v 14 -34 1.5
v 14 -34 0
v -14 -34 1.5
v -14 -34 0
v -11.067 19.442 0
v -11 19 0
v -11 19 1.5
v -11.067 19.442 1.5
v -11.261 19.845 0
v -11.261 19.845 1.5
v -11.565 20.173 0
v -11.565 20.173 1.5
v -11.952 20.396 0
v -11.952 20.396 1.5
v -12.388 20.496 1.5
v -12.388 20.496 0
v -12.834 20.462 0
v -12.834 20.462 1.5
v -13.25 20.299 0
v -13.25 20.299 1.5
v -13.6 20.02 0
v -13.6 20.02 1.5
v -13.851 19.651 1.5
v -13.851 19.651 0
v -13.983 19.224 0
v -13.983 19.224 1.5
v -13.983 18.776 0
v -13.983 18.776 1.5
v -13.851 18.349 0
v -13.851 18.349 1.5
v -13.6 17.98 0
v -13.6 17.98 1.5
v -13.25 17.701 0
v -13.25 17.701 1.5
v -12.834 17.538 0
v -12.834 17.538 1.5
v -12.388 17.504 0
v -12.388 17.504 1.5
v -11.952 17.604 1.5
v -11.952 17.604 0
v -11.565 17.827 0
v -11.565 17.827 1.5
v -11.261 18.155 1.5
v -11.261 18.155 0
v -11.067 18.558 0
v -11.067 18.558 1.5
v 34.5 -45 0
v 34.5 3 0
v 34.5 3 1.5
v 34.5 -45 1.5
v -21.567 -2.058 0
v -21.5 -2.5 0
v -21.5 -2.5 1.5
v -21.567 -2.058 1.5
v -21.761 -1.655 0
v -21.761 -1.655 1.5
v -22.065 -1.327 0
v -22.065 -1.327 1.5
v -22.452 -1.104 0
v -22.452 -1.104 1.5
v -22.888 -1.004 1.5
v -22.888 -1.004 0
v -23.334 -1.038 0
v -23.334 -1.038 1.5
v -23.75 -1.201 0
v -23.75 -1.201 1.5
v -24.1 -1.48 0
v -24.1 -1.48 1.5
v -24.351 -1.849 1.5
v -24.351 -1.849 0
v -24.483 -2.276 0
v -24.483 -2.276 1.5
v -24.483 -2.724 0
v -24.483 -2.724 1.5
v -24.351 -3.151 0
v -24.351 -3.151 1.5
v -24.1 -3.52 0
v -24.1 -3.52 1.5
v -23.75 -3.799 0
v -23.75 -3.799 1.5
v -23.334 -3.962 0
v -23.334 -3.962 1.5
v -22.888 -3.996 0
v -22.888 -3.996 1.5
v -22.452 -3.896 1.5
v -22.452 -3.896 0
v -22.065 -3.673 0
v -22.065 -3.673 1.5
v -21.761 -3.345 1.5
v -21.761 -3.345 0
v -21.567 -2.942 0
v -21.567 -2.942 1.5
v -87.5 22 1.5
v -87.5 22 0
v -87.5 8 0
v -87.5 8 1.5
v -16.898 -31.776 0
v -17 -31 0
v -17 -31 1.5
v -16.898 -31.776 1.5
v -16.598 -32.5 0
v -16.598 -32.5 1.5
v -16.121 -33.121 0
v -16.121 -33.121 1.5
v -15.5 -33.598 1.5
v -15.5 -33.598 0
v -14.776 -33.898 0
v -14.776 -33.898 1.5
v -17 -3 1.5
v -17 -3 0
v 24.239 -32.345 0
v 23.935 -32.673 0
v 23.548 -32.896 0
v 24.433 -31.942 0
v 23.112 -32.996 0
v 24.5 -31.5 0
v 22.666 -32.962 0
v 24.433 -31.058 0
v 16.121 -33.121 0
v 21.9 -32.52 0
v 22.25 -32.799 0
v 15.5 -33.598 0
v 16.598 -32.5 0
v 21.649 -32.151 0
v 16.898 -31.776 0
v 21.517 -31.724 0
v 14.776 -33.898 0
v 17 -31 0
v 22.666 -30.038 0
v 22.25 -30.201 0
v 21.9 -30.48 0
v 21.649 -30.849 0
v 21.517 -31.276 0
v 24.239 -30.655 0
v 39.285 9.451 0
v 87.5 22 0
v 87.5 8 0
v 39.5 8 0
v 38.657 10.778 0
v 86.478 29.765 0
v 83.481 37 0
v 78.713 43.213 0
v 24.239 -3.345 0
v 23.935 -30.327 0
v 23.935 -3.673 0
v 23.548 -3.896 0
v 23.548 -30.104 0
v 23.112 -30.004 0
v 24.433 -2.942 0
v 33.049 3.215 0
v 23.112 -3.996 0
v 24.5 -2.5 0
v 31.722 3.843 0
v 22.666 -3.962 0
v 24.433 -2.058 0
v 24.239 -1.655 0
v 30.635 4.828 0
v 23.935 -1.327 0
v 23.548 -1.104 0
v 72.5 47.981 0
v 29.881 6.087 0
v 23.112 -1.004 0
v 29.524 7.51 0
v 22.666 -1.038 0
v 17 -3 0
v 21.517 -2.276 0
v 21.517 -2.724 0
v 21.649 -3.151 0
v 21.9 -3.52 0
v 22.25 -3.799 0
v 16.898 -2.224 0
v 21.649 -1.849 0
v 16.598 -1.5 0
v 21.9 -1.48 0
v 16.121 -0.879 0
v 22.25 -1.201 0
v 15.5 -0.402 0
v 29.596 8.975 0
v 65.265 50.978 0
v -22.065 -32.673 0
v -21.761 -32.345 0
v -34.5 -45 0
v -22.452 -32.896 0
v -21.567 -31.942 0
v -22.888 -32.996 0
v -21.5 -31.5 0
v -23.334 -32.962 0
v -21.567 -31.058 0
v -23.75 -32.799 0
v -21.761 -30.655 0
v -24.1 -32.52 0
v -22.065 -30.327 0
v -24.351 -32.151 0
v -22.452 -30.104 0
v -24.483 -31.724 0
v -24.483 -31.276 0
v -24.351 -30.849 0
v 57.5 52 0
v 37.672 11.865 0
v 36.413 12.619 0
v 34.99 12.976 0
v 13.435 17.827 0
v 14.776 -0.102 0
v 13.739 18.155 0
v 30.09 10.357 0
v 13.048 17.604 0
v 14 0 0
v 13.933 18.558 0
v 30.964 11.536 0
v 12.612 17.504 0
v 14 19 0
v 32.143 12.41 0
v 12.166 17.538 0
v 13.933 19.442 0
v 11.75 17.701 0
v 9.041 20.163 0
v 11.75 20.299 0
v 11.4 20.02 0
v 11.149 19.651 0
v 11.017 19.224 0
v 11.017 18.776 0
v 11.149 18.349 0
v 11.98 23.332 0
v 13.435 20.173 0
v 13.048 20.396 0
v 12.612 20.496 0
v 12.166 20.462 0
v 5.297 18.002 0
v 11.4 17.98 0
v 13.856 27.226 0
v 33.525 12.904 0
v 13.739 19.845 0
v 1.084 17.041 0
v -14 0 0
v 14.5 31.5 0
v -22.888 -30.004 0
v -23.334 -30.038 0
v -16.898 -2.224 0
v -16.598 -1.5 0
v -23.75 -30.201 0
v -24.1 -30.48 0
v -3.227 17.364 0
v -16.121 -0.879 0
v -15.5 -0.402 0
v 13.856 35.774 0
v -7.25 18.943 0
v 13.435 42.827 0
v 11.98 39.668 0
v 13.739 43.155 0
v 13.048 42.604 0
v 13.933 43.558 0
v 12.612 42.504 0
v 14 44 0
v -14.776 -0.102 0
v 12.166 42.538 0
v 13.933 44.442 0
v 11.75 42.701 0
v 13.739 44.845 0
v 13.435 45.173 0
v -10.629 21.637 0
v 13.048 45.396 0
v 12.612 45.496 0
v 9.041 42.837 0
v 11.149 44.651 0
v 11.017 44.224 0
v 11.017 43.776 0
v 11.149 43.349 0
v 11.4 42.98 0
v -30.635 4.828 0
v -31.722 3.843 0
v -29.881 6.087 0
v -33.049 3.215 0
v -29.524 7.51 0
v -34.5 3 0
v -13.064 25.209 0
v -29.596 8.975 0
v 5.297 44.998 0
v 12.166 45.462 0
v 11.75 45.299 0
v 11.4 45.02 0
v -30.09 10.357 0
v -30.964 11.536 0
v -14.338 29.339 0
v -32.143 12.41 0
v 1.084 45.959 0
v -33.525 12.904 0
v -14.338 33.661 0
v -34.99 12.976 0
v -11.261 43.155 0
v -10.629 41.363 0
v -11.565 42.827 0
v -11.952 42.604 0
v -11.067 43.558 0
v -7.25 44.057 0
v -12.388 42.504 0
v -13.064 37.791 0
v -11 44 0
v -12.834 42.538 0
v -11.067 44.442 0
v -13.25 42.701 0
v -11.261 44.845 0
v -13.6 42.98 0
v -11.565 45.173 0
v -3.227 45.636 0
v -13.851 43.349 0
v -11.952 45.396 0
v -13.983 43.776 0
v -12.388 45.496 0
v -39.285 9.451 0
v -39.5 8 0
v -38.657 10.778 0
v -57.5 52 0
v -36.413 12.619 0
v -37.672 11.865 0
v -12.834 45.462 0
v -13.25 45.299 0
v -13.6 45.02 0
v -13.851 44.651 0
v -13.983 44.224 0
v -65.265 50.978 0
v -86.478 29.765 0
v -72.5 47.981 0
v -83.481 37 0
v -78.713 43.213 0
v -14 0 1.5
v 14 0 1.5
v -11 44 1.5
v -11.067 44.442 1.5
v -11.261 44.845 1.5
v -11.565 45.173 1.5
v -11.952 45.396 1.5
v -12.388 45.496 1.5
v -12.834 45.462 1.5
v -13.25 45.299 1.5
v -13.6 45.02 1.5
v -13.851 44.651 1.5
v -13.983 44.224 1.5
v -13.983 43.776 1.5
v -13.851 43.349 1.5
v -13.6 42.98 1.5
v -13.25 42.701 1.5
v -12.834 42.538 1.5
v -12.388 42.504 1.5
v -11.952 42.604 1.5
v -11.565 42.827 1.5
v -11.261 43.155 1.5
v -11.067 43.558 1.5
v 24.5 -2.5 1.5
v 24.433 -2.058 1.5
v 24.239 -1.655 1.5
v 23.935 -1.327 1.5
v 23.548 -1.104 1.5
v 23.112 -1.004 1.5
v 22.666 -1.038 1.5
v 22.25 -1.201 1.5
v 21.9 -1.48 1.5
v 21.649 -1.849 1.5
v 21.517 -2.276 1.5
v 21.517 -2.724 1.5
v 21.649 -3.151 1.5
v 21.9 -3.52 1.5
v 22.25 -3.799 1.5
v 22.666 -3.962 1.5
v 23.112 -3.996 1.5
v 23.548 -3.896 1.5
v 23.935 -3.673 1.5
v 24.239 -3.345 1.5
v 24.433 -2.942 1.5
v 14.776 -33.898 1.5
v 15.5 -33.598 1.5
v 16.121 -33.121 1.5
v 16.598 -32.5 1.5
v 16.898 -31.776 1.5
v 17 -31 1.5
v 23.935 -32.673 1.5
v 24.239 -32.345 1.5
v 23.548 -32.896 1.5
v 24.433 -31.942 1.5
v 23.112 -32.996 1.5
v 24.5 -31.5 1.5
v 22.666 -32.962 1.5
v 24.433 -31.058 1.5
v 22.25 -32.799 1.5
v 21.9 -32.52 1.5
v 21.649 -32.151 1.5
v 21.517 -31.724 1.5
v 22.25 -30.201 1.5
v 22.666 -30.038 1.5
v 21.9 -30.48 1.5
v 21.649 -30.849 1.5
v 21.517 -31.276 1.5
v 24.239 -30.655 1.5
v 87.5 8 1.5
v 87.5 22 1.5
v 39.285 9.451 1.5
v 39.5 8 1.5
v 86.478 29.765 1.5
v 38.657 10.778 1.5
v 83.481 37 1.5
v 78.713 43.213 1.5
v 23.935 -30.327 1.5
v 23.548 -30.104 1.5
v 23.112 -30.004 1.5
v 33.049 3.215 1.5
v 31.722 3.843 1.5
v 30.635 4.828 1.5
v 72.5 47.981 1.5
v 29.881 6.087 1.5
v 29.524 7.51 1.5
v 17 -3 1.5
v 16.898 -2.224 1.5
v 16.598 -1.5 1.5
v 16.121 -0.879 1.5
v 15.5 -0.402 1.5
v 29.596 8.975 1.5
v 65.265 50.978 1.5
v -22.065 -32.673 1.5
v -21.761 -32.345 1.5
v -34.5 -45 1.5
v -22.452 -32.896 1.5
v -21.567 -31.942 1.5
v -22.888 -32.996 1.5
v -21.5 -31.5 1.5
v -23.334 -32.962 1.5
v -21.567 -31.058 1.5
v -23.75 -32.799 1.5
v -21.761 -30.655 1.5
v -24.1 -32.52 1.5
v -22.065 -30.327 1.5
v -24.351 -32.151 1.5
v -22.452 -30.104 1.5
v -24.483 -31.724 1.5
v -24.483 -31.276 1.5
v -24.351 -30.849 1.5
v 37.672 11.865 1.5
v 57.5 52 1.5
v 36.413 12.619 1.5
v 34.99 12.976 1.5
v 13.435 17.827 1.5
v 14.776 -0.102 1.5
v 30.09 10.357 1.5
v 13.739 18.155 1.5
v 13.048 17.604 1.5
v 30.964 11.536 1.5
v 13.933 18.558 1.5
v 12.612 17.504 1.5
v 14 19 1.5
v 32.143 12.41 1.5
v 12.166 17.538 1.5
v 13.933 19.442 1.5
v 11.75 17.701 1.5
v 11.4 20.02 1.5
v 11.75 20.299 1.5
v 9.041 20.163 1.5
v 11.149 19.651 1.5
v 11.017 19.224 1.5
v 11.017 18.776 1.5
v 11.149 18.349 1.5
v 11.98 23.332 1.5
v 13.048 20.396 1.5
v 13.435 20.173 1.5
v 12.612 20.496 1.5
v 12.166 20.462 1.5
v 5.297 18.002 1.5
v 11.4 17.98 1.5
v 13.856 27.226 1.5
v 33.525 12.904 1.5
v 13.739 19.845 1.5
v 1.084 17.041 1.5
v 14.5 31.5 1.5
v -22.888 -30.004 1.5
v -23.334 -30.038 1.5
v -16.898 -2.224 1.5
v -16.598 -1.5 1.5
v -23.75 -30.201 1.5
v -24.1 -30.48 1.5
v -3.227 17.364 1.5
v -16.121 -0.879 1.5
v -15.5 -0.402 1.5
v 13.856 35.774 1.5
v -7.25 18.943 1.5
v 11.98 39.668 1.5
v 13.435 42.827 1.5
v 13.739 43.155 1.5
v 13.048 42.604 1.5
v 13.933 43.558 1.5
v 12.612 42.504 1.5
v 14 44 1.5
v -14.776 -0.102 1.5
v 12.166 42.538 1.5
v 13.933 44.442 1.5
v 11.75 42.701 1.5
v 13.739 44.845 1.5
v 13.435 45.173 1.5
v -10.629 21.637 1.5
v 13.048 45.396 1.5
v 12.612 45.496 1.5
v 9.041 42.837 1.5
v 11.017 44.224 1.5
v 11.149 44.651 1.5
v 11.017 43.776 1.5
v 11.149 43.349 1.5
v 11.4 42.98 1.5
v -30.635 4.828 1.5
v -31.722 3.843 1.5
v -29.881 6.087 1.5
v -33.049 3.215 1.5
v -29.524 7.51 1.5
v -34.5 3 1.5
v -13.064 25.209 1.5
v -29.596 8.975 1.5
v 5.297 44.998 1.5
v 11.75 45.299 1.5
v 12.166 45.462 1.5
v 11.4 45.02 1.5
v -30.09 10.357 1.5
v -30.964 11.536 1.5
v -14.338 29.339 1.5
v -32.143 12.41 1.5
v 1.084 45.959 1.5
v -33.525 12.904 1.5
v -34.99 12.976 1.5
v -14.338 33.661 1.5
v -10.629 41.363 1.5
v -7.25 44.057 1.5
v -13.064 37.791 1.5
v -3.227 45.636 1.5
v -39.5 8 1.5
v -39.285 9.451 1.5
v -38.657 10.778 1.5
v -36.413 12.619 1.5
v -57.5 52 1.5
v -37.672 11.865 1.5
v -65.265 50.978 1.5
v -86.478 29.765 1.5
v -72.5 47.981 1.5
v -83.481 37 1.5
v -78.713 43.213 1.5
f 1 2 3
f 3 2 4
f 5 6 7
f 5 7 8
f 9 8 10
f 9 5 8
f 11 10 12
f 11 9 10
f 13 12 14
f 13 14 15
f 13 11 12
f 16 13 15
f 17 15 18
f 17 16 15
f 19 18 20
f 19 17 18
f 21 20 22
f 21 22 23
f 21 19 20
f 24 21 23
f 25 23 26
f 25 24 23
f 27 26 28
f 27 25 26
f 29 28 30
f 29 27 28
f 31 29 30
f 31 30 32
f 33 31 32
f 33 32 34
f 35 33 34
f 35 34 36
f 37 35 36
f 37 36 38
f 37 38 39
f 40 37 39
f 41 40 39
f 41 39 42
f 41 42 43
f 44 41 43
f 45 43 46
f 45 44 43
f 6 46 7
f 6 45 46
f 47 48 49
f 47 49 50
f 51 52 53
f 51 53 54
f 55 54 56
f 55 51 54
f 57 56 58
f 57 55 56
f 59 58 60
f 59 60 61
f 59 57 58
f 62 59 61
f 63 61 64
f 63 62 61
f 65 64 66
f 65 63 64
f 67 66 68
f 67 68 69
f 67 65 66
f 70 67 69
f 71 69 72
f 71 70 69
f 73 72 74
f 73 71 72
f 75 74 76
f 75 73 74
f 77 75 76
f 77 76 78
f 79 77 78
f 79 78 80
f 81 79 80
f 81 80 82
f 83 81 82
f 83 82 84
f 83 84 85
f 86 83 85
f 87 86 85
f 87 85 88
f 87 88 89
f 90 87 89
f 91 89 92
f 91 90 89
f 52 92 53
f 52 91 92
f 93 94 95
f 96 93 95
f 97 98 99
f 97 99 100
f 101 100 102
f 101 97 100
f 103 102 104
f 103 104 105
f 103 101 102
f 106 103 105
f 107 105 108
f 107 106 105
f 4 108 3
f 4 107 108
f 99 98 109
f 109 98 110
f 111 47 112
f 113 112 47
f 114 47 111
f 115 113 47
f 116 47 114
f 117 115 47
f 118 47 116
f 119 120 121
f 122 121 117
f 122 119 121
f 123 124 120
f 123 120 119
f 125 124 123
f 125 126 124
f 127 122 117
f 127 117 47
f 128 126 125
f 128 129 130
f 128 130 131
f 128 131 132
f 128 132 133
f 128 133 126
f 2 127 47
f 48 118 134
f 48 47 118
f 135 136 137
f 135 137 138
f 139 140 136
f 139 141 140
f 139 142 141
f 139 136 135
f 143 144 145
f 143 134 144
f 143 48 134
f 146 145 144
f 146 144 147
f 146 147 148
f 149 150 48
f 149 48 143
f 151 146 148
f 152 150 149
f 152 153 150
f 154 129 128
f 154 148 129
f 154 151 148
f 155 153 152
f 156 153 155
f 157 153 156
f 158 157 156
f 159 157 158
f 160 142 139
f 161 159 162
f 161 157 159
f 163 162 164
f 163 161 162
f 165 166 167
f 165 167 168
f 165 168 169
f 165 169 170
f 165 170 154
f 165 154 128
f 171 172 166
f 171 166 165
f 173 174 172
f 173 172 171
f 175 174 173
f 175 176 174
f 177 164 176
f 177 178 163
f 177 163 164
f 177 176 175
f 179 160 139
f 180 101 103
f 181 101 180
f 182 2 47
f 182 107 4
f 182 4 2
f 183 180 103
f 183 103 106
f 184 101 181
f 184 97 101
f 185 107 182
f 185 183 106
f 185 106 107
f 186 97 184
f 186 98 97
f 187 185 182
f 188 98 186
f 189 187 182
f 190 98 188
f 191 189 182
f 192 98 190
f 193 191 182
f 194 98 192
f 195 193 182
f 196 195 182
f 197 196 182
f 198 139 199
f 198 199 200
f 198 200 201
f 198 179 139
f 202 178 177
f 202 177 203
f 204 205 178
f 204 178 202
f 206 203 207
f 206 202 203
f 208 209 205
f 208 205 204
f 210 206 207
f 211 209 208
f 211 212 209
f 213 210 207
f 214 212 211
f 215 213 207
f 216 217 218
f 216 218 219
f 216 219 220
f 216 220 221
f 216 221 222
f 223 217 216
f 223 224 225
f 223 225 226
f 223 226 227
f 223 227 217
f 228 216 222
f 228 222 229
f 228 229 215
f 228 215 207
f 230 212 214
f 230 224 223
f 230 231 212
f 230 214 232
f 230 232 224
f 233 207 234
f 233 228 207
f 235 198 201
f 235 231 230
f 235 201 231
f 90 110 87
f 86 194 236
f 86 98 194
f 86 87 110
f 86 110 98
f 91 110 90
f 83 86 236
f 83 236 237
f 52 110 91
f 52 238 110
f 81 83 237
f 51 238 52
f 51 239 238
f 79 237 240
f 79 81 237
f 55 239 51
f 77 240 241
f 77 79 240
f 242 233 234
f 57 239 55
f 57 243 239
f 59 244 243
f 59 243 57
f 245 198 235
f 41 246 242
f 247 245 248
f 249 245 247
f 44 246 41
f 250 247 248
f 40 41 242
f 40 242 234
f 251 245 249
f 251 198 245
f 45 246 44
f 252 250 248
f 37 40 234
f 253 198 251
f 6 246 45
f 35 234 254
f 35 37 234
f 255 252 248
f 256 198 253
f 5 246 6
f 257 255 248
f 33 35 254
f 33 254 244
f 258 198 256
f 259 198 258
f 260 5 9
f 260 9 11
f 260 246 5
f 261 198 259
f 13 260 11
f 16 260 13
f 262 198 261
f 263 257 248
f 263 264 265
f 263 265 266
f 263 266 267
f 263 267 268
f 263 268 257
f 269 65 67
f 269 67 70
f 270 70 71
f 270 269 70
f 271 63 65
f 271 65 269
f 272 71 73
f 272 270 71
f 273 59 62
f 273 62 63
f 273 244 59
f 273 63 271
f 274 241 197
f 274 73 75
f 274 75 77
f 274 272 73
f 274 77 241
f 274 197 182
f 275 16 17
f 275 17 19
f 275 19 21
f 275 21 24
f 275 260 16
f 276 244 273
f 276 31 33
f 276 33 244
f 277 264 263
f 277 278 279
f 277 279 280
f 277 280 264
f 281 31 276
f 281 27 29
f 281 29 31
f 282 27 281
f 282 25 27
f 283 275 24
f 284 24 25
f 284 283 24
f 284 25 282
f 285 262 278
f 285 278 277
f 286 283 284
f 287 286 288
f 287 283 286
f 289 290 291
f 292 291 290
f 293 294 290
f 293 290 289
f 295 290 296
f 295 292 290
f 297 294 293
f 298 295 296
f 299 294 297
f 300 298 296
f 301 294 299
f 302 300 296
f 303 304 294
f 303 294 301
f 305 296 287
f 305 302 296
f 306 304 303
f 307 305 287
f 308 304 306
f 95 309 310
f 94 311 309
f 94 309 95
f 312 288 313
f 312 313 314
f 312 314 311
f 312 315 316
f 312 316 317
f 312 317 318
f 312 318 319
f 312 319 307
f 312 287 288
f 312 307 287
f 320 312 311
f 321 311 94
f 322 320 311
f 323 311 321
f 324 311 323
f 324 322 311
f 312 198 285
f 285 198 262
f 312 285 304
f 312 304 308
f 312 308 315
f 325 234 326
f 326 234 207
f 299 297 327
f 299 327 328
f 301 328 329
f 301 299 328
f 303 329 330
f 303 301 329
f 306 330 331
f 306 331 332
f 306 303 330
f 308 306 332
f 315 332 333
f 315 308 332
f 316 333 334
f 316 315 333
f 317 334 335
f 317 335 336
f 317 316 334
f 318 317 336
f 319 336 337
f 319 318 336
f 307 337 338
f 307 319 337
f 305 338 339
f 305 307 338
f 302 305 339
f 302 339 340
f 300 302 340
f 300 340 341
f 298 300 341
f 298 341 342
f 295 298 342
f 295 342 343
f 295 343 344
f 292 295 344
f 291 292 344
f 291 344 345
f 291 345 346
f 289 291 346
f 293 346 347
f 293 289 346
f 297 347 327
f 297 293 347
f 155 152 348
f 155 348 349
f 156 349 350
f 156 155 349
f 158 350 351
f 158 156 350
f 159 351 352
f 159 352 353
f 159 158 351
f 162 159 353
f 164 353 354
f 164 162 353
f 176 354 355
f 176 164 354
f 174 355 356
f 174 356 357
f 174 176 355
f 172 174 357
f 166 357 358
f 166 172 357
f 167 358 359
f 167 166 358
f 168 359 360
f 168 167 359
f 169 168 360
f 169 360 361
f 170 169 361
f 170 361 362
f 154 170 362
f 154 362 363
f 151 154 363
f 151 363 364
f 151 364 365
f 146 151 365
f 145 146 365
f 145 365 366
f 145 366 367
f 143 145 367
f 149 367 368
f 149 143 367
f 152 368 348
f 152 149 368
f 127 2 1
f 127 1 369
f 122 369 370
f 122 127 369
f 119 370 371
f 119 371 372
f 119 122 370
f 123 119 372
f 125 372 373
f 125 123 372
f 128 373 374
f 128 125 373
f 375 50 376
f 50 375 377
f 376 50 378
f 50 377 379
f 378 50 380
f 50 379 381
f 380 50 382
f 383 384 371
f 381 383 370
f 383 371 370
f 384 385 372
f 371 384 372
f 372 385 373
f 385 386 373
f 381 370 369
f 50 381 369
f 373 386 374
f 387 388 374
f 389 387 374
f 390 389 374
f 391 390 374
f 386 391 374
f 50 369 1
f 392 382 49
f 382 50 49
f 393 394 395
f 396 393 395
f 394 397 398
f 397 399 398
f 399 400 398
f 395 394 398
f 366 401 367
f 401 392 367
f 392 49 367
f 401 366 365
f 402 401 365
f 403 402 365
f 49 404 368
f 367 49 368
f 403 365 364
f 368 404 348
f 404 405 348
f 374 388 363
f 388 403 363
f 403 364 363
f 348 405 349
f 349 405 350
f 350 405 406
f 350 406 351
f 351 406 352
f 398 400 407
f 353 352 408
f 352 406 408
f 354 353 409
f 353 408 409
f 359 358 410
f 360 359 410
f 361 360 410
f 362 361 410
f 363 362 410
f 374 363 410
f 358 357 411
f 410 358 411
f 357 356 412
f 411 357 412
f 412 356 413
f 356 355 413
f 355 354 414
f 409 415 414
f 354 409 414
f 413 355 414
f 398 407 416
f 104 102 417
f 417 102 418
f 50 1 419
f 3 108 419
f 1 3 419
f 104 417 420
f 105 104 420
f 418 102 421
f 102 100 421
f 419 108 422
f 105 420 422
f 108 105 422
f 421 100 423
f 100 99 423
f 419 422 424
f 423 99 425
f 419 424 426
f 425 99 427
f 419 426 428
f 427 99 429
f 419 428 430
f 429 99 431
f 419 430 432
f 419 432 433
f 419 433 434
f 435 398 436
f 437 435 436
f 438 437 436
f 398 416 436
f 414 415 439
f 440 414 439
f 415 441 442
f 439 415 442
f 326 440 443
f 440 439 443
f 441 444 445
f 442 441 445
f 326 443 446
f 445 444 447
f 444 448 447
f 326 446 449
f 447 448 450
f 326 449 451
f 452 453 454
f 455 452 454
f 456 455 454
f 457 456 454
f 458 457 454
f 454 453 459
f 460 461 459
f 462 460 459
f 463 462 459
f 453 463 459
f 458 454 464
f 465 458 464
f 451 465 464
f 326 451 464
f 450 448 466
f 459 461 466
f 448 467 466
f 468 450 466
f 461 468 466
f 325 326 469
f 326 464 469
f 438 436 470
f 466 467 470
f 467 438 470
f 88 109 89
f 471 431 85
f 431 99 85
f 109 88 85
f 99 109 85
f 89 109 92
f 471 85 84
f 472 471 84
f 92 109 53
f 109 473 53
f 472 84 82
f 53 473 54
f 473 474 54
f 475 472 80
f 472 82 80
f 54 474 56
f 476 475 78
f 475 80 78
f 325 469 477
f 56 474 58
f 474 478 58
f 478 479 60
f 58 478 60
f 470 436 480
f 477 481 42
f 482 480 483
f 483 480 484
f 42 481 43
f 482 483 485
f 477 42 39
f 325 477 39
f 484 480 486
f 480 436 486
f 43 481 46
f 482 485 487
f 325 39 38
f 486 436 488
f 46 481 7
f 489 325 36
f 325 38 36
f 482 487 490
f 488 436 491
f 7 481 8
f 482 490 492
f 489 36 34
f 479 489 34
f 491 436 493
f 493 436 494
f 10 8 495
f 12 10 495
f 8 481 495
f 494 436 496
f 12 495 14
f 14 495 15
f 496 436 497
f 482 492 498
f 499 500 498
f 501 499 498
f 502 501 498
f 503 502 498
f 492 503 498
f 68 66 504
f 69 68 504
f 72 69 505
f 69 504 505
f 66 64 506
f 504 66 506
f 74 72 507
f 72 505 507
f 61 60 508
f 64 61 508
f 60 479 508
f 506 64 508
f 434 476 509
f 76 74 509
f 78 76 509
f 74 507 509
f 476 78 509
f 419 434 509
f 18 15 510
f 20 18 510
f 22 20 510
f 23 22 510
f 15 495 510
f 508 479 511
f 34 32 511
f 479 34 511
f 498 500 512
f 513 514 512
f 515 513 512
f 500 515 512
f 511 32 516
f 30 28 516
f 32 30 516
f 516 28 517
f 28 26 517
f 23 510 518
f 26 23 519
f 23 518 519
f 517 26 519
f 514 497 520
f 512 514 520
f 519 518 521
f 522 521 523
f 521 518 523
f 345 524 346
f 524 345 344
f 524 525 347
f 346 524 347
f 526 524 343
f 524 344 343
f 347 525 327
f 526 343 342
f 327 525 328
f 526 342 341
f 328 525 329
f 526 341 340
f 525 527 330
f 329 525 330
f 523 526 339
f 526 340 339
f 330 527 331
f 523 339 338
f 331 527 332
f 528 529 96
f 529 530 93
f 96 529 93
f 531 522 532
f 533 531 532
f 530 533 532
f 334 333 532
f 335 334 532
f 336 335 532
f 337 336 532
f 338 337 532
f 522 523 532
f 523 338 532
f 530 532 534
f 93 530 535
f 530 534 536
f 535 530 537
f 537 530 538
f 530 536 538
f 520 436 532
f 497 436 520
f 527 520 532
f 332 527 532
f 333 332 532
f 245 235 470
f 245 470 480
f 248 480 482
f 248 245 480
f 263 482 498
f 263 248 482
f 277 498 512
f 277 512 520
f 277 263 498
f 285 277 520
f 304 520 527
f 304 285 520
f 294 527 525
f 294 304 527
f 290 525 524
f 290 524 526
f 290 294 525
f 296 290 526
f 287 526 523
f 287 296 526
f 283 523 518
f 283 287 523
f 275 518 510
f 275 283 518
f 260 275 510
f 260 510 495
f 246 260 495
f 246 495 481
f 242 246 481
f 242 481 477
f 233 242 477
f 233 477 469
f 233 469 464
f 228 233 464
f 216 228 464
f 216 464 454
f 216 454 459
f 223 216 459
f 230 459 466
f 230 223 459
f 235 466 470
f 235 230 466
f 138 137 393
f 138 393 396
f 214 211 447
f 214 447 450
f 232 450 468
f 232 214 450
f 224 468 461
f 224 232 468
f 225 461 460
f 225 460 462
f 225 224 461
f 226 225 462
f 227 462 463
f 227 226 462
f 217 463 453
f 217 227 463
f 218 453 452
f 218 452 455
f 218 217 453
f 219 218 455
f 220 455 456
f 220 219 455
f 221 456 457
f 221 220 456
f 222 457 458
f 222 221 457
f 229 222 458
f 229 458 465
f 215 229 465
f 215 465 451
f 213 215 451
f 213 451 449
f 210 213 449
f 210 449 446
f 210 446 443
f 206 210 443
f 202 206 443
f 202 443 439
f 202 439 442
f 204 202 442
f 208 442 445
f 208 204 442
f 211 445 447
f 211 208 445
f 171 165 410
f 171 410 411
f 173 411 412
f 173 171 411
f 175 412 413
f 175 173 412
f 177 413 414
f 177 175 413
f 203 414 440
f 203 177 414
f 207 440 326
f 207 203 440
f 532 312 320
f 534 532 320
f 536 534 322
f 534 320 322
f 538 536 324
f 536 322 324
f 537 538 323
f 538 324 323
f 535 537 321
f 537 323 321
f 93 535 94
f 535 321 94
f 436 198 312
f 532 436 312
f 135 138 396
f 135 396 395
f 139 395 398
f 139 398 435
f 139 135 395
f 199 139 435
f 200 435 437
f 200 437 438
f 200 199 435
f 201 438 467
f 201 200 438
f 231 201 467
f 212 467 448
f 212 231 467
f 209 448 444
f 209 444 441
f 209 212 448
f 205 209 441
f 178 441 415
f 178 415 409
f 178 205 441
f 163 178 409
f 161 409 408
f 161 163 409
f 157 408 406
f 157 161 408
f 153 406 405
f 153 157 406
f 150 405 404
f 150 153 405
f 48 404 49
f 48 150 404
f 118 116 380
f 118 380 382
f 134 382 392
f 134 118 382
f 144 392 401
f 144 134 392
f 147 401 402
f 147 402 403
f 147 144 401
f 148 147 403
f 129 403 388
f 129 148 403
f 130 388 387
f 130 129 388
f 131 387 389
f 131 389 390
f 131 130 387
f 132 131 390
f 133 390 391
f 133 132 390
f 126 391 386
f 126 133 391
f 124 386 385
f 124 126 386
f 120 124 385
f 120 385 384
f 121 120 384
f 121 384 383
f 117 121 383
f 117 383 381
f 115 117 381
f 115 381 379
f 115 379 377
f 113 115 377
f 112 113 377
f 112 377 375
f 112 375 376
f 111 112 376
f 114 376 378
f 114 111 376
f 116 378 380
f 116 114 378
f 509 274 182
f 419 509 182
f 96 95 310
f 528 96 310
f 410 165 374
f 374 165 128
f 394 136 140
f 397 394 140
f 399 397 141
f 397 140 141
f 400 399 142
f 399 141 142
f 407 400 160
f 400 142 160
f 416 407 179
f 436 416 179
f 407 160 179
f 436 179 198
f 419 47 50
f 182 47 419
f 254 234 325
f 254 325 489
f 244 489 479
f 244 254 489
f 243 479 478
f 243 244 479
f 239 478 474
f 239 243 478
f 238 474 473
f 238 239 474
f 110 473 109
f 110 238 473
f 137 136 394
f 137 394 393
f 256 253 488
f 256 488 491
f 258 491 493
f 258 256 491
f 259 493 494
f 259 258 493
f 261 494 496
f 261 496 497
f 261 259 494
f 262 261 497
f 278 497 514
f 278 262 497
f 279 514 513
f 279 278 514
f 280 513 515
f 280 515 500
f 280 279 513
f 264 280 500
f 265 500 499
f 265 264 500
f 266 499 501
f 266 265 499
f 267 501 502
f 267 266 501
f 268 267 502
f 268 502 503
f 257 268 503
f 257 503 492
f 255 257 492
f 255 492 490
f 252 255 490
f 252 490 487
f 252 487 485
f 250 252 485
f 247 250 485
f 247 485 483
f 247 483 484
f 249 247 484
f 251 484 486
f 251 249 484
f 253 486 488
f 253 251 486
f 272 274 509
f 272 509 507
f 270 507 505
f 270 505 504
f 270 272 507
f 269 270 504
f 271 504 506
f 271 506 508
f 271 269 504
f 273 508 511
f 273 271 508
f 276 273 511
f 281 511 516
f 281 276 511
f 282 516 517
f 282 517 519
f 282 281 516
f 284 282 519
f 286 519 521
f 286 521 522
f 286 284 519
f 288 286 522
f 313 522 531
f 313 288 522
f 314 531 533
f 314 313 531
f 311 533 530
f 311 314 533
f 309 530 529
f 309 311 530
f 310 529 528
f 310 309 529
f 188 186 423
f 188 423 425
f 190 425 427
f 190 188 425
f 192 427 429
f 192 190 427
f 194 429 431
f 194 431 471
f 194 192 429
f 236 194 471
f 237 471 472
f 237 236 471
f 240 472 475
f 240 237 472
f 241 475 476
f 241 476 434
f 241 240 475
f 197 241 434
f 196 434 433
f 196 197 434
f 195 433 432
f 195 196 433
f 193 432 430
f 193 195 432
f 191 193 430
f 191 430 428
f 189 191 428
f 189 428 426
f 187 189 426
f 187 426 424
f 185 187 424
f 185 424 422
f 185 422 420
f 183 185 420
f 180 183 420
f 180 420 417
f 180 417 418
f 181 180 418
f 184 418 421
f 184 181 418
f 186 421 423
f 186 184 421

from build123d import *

# Parameters (mm, degrees)
SKETCH_R   = 1.5
SKETCH_R_2 = 14.5
PAD_DEPTH  = 1.5


with BuildPart() as part:
    # Sketch → Pad (new body)
    with BuildSketch(Plane.XY):
        with BuildLine():
            Line((34.5, -45), (-34.5, -45))
            Line((-34.5, 3), (-34.5, -45))
            ThreePointArc((-34.5, 3), (-30.964466, 11.535534), (-39.5, 8))
            Line((-87.5, 8), (-39.5, 8))
            Line((-87.5, 22), (-87.5, 8))
            ThreePointArc((-57.5, 52), (-78.713203, 43.213203), (-87.5, 22))
            Line((57.5, 52), (-57.5, 52))
            ThreePointArc((87.5, 22), (78.713203, 43.213203), (57.5, 52))
            Line((87.5, 22), (87.5, 8))
            Line((87.5, 8), (39.5, 8))
            ThreePointArc((39.5, 8), (30.964466, 11.535534), (34.5, 3))
            Line((34.5, 3), (34.5, -45))
        make_face()
        with Locations((23, -2.5)):
            Circle(SKETCH_R, mode=Mode.SUBTRACT)
        with Locations((23, -31.5)):
            Circle(SKETCH_R, mode=Mode.SUBTRACT)
        with Locations((-23, -2.5)):
            Circle(SKETCH_R, mode=Mode.SUBTRACT)
        with Locations((-23, -31.5)):
            Circle(SKETCH_R, mode=Mode.SUBTRACT)
        with Locations((0, 31.5)):
            Circle(SKETCH_R_2, mode=Mode.SUBTRACT)
        with Locations((-12.5, 44)):
            Circle(SKETCH_R, mode=Mode.SUBTRACT)
        with Locations((12.5, 44)):
            Circle(SKETCH_R, mode=Mode.SUBTRACT)
        with Locations((12.5, 19)):
            Circle(SKETCH_R, mode=Mode.SUBTRACT)
        with Locations((-12.5, 19)):
            Circle(SKETCH_R, mode=Mode.SUBTRACT)
        with BuildLine():
            Line((-14, 0), (14, 0))
            ThreePointArc((17, -3), (16.12132, -0.87868), (14, 0))
            Line((17, -3), (17, -31))
            ThreePointArc((14, -34), (16.12132, -33.12132), (17, -31))
            Line((14, -34), (-14, -34))
            ThreePointArc((-17, -31), (-16.12132, -33.12132), (-14, -34))
            Line((-17, -31), (-17, -3))
            ThreePointArc((-14, 0), (-16.12132, -0.87868), (-17, -3))
        make_face(mode=Mode.SUBTRACT)
    extrude(amount=PAD_DEPTH)


solid = part.part
